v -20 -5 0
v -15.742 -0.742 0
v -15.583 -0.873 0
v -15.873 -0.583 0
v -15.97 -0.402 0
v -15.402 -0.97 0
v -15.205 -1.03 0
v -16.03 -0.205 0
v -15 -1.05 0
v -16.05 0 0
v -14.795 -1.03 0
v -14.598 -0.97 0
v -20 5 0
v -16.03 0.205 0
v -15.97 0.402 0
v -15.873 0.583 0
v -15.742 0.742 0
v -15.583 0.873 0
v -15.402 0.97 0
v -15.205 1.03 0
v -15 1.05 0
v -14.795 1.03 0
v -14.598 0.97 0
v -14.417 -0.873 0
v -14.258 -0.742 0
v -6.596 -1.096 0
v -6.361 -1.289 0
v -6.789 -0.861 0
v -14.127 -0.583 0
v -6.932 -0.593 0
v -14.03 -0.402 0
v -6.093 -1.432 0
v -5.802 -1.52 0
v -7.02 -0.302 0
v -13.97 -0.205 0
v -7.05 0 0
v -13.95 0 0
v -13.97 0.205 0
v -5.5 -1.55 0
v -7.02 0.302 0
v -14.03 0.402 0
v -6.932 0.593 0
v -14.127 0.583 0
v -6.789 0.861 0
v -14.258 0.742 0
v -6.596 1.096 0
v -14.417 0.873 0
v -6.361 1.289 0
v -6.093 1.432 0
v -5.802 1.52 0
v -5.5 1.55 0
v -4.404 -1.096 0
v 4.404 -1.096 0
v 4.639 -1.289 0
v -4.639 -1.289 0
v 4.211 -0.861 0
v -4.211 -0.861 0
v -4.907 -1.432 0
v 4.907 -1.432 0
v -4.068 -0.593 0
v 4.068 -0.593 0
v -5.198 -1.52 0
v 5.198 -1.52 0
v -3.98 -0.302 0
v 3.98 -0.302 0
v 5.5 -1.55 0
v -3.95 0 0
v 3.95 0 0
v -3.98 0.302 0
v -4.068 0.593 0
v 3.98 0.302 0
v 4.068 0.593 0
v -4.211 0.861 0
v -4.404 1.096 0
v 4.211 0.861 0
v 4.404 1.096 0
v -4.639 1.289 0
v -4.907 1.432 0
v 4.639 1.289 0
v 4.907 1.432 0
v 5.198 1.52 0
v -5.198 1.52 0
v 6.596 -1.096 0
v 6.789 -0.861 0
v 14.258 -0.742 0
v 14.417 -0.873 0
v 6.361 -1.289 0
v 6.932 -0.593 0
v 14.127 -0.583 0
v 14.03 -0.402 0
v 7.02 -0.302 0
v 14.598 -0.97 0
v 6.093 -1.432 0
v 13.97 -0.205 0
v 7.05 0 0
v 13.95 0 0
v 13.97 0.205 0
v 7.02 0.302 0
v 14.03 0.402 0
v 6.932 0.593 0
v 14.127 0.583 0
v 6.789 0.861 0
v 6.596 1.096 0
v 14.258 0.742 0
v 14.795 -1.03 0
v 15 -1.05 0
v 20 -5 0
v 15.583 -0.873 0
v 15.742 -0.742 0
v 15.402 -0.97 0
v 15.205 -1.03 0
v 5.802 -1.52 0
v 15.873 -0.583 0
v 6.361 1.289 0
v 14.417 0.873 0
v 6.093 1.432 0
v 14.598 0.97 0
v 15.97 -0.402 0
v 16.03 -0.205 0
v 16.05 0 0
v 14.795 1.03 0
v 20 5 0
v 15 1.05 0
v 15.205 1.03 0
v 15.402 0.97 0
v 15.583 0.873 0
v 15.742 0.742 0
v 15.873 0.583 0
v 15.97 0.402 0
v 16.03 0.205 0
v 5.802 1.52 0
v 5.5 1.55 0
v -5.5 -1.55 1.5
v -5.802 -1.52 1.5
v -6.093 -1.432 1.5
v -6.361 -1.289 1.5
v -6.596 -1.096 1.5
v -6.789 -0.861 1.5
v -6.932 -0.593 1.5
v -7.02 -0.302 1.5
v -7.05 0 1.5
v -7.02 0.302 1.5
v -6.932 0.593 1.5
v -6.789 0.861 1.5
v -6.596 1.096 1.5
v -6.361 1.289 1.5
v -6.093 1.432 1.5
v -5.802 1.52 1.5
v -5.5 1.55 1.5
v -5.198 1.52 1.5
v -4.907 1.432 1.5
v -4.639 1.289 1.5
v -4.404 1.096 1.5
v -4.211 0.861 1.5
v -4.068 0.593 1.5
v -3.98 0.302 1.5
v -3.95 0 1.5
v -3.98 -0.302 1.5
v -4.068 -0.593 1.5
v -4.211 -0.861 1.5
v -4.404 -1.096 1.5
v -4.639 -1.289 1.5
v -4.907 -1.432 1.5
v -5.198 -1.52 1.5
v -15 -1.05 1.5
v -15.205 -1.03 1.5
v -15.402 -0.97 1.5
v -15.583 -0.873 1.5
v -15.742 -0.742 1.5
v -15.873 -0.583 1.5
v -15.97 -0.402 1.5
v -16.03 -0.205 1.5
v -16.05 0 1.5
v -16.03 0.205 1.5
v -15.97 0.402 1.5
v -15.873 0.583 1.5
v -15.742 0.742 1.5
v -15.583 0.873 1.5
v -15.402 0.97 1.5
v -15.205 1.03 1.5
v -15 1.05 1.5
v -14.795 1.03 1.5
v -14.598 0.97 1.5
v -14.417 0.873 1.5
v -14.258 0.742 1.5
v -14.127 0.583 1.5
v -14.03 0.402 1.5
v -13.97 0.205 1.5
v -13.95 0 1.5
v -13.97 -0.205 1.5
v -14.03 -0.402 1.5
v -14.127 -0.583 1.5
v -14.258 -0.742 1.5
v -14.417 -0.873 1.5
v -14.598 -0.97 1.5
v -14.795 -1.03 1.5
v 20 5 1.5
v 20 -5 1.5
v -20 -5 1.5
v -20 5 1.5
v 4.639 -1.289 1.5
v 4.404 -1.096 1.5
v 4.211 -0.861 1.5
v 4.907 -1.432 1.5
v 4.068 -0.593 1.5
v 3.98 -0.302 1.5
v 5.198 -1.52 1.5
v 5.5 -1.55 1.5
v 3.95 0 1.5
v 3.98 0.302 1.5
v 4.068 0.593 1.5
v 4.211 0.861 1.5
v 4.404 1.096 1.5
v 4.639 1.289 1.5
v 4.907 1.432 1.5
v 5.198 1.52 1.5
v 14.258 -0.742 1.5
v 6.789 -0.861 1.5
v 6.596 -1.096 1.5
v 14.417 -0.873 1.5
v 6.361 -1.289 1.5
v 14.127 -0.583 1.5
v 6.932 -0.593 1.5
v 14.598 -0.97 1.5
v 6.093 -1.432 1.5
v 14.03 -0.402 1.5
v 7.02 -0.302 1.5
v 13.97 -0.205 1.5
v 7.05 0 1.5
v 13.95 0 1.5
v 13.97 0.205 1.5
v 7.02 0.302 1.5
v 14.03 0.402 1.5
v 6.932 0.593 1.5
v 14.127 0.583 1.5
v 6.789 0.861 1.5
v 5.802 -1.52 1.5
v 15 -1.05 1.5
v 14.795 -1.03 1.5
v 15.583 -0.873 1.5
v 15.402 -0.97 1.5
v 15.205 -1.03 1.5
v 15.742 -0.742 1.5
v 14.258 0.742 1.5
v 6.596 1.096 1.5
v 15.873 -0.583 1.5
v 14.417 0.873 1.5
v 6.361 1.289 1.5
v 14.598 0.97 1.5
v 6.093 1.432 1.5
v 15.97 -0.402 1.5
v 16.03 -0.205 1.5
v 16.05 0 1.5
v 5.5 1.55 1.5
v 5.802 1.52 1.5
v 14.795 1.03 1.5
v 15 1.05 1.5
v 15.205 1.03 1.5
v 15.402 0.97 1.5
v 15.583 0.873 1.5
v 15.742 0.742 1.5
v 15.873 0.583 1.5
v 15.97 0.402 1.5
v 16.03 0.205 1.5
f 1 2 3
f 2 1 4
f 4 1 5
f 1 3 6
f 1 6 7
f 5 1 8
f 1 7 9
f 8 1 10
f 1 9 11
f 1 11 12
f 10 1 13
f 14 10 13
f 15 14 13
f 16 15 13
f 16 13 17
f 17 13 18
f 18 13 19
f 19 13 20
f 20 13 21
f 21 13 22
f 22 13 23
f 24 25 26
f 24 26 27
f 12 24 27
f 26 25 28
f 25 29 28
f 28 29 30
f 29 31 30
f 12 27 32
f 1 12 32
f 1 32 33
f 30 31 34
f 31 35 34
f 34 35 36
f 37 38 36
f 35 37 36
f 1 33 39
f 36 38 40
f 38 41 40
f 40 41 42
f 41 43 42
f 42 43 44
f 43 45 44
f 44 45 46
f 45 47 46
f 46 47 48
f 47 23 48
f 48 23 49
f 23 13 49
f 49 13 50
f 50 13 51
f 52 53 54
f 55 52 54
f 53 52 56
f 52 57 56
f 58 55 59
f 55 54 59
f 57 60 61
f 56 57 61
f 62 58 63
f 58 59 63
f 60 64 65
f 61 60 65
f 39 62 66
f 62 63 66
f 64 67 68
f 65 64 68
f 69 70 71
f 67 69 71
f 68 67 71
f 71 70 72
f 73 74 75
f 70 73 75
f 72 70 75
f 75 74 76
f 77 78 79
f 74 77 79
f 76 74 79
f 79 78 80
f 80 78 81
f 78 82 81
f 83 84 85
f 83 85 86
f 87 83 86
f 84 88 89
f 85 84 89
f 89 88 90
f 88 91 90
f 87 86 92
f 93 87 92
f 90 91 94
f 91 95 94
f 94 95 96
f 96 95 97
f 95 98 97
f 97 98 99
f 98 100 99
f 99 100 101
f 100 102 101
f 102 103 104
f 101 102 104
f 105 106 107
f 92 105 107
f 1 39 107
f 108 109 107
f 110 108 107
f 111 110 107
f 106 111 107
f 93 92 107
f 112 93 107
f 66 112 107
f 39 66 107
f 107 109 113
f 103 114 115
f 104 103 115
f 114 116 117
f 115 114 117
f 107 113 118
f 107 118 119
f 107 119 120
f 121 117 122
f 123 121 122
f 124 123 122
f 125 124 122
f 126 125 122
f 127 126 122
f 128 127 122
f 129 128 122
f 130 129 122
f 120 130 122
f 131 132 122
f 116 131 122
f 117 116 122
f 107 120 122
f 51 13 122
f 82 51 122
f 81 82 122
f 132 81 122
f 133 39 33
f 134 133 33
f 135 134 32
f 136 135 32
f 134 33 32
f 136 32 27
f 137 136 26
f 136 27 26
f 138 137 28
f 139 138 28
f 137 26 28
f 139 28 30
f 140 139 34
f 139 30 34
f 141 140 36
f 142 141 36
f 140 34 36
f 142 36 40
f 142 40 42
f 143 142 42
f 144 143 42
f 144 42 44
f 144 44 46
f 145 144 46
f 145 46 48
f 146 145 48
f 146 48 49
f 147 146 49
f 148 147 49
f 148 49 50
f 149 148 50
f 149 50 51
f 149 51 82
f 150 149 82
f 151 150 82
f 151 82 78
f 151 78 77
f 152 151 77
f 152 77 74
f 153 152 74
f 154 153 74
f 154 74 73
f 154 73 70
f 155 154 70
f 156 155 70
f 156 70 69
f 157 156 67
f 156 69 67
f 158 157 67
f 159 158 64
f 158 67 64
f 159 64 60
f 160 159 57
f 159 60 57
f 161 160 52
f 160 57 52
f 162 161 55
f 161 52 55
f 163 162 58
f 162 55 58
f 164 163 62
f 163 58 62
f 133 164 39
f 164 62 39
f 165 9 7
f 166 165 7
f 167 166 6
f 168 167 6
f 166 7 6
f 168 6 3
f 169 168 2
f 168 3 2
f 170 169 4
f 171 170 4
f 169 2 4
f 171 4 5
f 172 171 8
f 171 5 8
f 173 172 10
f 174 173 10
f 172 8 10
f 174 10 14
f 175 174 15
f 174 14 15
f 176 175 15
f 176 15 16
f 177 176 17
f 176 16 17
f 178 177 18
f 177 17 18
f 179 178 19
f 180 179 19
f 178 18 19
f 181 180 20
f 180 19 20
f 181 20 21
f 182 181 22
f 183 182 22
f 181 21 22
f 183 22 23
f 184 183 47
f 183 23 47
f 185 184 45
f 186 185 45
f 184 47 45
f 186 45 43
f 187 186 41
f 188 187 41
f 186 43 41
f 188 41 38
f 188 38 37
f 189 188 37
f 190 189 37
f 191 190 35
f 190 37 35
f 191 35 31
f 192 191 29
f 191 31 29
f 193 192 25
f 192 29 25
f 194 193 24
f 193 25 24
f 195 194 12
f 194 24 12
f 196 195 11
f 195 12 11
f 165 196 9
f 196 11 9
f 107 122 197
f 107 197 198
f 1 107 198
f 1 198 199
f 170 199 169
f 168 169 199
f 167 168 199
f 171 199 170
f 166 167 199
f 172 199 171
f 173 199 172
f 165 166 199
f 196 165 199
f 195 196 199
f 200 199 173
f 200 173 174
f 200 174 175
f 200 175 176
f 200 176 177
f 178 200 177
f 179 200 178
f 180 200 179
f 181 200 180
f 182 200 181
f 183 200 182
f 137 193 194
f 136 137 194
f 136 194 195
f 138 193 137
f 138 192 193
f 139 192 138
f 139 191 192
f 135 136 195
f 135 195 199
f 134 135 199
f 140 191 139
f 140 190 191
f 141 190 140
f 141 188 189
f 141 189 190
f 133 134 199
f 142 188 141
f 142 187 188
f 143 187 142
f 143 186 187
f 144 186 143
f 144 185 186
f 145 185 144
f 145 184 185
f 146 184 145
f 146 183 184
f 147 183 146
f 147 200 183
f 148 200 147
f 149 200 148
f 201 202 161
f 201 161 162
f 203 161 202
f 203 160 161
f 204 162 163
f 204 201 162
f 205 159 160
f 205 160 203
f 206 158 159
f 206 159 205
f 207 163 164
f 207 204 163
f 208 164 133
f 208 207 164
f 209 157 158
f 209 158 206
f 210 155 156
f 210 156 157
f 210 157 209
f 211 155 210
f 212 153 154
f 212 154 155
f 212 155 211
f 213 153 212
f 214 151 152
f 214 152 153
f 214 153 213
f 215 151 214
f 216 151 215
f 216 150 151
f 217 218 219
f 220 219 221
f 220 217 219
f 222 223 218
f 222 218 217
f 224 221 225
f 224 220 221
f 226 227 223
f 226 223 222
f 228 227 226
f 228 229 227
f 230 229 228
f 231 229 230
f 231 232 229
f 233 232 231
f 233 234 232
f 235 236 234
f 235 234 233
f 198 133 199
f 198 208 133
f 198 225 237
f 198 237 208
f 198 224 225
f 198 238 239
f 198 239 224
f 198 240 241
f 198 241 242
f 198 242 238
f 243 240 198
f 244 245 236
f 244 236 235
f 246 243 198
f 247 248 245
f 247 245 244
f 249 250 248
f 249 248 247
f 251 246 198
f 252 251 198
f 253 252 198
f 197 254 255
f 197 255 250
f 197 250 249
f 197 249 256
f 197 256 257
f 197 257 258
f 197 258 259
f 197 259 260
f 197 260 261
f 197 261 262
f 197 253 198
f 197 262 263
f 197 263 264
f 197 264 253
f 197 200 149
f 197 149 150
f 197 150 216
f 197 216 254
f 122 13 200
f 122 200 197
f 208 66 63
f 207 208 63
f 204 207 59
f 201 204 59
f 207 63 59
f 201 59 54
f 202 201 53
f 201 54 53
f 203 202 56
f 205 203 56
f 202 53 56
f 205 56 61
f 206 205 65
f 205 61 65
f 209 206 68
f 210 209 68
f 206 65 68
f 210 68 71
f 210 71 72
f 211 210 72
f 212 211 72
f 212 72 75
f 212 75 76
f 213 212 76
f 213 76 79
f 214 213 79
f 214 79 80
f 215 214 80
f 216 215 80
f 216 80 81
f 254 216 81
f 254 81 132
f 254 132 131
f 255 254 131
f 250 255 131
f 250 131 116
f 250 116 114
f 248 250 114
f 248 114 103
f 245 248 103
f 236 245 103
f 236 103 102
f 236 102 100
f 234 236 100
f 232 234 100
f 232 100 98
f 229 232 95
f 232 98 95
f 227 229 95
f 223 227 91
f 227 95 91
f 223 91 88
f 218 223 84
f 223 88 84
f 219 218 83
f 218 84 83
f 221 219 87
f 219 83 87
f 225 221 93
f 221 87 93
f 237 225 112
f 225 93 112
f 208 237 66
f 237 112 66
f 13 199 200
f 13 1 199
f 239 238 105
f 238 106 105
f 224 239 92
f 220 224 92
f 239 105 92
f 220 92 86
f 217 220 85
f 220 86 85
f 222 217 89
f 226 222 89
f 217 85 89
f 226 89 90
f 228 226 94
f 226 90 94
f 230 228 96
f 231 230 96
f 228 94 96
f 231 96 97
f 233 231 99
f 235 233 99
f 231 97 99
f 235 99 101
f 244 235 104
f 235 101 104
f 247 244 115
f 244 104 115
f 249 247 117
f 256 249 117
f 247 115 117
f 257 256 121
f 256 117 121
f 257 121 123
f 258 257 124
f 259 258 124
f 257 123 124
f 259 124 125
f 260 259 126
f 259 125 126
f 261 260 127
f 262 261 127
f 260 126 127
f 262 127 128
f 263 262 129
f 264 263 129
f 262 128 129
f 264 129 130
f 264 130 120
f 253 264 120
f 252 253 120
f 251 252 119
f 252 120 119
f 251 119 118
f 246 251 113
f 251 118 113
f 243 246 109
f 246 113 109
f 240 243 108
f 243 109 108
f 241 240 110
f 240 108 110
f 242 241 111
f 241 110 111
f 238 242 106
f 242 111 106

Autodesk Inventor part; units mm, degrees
ref_plane "YZ Plane" through (0, 0, 0) normal (1, 0, 0) x (0, 1, 0)
ref_plane "XZ Plane" through (0, 0, 0) normal (0, 1, 0) x (-1, 0, 0)
ref_plane "XY Plane" through (0, 0, 0) normal (0, 0, 1) x (1, 0, 0)
sketch "スケッチ1" plane through (0, 0, 0) normal (0, 0, 1) x (1, 0, 0)
  line L0 (-20, 5) -> (20, 5)
  line L1 (20, 5) -> (20, -5)
  line L2 (20, -5) -> (-20, -5)
  line L3 (-20, -5) -> (-20, 5)
  line L4 (-20, 5) -> (20, -5) construction
  line L5 (20, 5) -> (-20, -5) construction
  point P0 (0, 0)
  dimension "d0" = 40
  dimension "d1" = 10
extrude "押し出し1" add sketch "スケッチ1" along normal blind 1.5
sketch "スケッチ2" plane through (0, 0, 1.5) normal (0, 0, 1) x (1, 0, 0)
  point P0 (0, 0)
  point P1 (-5.5, 0)
  point P2 (5.5, 0)
  dimension "d4" = 0
  dimension "d5" = 11
  dimension "d6" = 5.5
hole "穴1" at (-5.5, 0, 1.5) at (5.5, 0, 1.5) direction (0, 0, -1) diameter 3.1 end through all
sketch "スケッチ3" plane through (0, 0, 1.5) normal (0, 0, 1) x (1, 0, 0)
  line L0 (20, -5) -> (20, 5) projected
  line L1 (-20, 5) -> (-20, -5) projected
  point P0 (0, 0)
  point P1 (-15, 0)
  point P2 (15, 0)
  dimension "d14" = 5
  dimension "d15" = 5
hole "穴2" at (-15, 0, 1.5) at (15, 0, 1.5) direction (0, 0, -1) diameter 2.1 end through all
properties material "アルミニウム 5052 H32"
